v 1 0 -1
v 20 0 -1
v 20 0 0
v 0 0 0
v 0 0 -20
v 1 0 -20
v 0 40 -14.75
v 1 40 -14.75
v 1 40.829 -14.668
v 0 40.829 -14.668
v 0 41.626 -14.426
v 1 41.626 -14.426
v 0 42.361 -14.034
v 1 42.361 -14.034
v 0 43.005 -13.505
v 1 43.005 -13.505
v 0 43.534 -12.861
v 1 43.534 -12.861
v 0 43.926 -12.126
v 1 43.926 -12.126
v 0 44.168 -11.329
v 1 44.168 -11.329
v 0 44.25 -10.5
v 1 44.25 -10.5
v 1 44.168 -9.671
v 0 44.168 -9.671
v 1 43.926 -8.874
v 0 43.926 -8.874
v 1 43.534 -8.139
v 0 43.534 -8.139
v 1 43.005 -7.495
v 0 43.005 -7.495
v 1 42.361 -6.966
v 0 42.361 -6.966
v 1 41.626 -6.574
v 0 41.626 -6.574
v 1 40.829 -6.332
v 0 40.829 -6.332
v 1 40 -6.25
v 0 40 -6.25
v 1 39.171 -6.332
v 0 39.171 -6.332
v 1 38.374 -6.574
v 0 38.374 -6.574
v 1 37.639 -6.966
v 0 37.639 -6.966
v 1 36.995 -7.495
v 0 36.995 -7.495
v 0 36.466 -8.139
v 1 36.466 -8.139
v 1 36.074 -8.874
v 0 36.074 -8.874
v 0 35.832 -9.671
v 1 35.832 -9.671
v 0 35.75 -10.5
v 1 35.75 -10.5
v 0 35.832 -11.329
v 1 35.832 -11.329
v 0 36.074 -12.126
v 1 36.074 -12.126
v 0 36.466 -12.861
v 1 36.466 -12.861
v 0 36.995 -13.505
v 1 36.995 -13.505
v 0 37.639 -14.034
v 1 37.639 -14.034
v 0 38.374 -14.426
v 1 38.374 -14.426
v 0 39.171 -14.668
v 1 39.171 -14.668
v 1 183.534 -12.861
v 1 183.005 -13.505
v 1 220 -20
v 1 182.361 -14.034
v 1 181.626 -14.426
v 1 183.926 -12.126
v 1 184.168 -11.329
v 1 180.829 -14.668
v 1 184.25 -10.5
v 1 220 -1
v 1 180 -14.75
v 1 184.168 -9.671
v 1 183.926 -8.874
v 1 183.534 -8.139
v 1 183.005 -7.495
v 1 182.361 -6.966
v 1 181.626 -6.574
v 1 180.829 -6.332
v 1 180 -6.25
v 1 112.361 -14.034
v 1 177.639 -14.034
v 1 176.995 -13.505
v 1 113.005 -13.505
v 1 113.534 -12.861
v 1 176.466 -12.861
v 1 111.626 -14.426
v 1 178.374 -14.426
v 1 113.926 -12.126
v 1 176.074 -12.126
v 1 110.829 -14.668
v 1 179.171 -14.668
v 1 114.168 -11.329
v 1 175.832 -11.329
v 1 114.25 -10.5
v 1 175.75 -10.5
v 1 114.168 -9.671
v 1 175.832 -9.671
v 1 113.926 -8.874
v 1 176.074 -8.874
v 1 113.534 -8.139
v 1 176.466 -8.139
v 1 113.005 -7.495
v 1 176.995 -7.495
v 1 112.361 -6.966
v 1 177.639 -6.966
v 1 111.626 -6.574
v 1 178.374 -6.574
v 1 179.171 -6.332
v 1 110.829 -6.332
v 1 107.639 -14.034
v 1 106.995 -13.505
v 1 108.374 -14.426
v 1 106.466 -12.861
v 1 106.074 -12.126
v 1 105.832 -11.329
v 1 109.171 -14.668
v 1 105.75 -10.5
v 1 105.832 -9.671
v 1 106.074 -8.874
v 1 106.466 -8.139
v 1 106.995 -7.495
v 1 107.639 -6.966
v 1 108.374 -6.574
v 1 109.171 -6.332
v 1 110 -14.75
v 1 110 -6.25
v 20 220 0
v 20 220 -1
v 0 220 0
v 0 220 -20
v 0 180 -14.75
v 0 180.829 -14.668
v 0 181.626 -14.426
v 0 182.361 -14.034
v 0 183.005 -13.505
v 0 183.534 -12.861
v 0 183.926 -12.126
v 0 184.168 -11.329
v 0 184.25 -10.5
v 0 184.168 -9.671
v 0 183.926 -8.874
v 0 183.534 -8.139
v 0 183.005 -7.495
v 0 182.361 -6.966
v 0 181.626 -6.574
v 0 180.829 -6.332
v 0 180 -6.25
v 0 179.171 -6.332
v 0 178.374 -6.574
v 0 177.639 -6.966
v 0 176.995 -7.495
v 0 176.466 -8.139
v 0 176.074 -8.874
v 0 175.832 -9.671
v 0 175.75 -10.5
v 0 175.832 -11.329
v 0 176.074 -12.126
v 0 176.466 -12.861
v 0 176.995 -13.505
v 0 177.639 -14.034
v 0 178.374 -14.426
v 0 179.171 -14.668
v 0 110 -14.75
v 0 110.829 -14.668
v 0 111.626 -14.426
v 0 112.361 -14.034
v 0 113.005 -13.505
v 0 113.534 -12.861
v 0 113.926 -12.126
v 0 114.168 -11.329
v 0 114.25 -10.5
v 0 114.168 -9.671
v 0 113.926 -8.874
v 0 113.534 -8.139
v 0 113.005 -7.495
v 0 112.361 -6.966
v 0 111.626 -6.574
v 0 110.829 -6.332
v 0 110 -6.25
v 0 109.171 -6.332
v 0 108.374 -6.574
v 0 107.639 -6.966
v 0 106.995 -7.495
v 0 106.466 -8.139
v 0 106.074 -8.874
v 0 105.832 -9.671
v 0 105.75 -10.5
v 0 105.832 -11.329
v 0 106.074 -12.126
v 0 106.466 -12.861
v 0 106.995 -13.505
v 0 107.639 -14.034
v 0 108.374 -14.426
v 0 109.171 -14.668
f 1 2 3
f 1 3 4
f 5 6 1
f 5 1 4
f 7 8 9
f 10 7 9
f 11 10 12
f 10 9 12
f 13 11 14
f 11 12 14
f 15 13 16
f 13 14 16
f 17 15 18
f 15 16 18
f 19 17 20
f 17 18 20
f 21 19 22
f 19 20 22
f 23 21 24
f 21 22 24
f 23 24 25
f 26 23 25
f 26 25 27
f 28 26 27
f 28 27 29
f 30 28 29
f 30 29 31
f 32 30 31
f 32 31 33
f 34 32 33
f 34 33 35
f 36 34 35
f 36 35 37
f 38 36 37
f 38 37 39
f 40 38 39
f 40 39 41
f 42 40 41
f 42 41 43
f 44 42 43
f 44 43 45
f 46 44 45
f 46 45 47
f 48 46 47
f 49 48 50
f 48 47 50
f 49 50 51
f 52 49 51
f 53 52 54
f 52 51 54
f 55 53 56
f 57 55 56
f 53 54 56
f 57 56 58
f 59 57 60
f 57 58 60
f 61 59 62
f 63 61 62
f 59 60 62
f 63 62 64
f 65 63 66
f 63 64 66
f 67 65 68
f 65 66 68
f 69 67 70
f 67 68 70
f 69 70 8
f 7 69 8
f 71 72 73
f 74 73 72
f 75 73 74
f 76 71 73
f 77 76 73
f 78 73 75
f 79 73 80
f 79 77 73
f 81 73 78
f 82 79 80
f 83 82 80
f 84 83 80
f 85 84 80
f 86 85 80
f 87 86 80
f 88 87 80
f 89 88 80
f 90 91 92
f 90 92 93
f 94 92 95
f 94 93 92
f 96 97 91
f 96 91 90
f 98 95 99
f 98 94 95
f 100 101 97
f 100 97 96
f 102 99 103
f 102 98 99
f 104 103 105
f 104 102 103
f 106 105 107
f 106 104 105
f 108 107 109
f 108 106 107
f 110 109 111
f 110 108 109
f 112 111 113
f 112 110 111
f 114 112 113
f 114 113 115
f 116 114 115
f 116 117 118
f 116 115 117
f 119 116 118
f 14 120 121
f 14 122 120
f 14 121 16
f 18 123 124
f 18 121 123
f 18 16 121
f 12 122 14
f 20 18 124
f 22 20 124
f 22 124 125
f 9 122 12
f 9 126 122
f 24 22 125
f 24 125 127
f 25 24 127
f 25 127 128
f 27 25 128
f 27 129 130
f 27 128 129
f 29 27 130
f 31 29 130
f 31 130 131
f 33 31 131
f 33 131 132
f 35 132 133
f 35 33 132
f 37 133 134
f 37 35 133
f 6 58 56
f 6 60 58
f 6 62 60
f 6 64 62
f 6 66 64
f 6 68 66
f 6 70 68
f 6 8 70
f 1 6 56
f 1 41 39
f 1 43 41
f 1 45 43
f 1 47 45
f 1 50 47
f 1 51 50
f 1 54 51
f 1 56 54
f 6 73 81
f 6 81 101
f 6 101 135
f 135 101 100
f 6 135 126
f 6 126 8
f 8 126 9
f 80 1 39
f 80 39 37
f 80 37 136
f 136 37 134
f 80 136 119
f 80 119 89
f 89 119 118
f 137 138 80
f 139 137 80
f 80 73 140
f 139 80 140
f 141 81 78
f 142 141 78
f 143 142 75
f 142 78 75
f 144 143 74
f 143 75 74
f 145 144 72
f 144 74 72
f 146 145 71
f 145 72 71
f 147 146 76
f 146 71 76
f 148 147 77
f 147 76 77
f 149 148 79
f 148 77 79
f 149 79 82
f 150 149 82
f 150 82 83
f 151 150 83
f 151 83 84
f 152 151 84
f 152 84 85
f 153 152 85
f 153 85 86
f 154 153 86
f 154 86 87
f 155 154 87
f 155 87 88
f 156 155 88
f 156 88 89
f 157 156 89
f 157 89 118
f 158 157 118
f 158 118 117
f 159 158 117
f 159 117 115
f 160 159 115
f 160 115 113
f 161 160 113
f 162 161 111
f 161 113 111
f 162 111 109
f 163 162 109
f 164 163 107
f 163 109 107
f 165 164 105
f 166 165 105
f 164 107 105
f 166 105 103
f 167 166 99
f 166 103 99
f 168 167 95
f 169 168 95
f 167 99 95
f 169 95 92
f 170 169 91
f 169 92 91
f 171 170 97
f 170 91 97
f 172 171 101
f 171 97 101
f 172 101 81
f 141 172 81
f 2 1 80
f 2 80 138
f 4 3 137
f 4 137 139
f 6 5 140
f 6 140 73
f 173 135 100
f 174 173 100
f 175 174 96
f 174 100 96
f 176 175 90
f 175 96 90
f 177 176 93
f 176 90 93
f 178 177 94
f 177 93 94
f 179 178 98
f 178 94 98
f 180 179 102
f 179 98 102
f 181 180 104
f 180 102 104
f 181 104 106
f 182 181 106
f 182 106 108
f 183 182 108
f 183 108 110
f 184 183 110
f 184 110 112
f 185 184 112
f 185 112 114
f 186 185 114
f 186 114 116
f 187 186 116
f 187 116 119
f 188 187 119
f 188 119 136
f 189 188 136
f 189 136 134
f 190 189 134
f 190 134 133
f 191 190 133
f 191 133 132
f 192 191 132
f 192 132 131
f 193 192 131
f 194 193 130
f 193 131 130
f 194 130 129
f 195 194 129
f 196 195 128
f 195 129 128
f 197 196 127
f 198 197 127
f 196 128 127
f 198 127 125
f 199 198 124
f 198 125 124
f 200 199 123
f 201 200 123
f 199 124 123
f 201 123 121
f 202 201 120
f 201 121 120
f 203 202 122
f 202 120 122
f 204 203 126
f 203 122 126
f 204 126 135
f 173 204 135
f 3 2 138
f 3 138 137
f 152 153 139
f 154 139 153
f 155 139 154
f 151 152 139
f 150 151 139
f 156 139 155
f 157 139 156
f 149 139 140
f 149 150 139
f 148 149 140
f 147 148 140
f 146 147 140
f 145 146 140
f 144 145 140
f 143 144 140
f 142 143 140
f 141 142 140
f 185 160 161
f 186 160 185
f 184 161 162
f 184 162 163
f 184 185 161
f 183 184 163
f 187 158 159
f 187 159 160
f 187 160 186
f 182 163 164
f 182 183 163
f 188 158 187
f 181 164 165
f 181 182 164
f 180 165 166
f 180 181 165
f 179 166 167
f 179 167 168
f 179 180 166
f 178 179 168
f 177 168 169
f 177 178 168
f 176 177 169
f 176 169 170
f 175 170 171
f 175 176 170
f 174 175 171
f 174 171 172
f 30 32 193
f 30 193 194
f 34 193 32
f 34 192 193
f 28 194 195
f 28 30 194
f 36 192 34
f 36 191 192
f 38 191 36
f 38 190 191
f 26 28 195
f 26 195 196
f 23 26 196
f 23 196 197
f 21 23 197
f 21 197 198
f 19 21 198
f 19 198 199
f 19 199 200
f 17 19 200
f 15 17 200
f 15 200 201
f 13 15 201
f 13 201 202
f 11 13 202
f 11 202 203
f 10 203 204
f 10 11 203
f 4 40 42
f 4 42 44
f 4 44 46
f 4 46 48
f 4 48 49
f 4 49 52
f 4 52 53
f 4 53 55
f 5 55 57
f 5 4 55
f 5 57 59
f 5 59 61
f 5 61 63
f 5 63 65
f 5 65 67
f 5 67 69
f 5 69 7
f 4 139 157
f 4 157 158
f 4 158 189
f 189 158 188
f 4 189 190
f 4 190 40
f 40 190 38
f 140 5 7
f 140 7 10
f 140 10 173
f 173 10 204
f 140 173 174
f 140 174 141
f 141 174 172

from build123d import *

# Parameters (mm, degrees)
EXTRUDE_1_DEPTH     = 220
SKETCH_2_R          = 4.25
CUT_EXTRUDE_1_DEPTH = 2


with BuildPart() as part:
    # Эскиз1 → Бобышка-Вытянуть1 (new body)
    with BuildSketch(Plane(origin=(0, 0, 0), x_dir=(1, 0, 0), z_dir=(0, 1, 0))):
        Polygon((0, 0), (0, 20), (1, 20), (1, 1), (20, 1), (20, 0), align=None)
    extrude(amount=EXTRUDE_1_DEPTH)

    # Эскиз2 → Вырез-Вытянуть1 (cut, through all)
    with BuildSketch(Plane(origin=(1, 0, 0), x_dir=(0, 0, -1), z_dir=(1, 0, 0))):
        with Locations((10.5, 180)):
            Circle(SKETCH_2_R)
        with Locations((10.5, 110)):
            Circle(SKETCH_2_R)
        with Locations((10.5, 40)):
            Circle(SKETCH_2_R)
    extrude(amount=-CUT_EXTRUDE_1_DEPTH, mode=Mode.SUBTRACT)


solid = part.part
